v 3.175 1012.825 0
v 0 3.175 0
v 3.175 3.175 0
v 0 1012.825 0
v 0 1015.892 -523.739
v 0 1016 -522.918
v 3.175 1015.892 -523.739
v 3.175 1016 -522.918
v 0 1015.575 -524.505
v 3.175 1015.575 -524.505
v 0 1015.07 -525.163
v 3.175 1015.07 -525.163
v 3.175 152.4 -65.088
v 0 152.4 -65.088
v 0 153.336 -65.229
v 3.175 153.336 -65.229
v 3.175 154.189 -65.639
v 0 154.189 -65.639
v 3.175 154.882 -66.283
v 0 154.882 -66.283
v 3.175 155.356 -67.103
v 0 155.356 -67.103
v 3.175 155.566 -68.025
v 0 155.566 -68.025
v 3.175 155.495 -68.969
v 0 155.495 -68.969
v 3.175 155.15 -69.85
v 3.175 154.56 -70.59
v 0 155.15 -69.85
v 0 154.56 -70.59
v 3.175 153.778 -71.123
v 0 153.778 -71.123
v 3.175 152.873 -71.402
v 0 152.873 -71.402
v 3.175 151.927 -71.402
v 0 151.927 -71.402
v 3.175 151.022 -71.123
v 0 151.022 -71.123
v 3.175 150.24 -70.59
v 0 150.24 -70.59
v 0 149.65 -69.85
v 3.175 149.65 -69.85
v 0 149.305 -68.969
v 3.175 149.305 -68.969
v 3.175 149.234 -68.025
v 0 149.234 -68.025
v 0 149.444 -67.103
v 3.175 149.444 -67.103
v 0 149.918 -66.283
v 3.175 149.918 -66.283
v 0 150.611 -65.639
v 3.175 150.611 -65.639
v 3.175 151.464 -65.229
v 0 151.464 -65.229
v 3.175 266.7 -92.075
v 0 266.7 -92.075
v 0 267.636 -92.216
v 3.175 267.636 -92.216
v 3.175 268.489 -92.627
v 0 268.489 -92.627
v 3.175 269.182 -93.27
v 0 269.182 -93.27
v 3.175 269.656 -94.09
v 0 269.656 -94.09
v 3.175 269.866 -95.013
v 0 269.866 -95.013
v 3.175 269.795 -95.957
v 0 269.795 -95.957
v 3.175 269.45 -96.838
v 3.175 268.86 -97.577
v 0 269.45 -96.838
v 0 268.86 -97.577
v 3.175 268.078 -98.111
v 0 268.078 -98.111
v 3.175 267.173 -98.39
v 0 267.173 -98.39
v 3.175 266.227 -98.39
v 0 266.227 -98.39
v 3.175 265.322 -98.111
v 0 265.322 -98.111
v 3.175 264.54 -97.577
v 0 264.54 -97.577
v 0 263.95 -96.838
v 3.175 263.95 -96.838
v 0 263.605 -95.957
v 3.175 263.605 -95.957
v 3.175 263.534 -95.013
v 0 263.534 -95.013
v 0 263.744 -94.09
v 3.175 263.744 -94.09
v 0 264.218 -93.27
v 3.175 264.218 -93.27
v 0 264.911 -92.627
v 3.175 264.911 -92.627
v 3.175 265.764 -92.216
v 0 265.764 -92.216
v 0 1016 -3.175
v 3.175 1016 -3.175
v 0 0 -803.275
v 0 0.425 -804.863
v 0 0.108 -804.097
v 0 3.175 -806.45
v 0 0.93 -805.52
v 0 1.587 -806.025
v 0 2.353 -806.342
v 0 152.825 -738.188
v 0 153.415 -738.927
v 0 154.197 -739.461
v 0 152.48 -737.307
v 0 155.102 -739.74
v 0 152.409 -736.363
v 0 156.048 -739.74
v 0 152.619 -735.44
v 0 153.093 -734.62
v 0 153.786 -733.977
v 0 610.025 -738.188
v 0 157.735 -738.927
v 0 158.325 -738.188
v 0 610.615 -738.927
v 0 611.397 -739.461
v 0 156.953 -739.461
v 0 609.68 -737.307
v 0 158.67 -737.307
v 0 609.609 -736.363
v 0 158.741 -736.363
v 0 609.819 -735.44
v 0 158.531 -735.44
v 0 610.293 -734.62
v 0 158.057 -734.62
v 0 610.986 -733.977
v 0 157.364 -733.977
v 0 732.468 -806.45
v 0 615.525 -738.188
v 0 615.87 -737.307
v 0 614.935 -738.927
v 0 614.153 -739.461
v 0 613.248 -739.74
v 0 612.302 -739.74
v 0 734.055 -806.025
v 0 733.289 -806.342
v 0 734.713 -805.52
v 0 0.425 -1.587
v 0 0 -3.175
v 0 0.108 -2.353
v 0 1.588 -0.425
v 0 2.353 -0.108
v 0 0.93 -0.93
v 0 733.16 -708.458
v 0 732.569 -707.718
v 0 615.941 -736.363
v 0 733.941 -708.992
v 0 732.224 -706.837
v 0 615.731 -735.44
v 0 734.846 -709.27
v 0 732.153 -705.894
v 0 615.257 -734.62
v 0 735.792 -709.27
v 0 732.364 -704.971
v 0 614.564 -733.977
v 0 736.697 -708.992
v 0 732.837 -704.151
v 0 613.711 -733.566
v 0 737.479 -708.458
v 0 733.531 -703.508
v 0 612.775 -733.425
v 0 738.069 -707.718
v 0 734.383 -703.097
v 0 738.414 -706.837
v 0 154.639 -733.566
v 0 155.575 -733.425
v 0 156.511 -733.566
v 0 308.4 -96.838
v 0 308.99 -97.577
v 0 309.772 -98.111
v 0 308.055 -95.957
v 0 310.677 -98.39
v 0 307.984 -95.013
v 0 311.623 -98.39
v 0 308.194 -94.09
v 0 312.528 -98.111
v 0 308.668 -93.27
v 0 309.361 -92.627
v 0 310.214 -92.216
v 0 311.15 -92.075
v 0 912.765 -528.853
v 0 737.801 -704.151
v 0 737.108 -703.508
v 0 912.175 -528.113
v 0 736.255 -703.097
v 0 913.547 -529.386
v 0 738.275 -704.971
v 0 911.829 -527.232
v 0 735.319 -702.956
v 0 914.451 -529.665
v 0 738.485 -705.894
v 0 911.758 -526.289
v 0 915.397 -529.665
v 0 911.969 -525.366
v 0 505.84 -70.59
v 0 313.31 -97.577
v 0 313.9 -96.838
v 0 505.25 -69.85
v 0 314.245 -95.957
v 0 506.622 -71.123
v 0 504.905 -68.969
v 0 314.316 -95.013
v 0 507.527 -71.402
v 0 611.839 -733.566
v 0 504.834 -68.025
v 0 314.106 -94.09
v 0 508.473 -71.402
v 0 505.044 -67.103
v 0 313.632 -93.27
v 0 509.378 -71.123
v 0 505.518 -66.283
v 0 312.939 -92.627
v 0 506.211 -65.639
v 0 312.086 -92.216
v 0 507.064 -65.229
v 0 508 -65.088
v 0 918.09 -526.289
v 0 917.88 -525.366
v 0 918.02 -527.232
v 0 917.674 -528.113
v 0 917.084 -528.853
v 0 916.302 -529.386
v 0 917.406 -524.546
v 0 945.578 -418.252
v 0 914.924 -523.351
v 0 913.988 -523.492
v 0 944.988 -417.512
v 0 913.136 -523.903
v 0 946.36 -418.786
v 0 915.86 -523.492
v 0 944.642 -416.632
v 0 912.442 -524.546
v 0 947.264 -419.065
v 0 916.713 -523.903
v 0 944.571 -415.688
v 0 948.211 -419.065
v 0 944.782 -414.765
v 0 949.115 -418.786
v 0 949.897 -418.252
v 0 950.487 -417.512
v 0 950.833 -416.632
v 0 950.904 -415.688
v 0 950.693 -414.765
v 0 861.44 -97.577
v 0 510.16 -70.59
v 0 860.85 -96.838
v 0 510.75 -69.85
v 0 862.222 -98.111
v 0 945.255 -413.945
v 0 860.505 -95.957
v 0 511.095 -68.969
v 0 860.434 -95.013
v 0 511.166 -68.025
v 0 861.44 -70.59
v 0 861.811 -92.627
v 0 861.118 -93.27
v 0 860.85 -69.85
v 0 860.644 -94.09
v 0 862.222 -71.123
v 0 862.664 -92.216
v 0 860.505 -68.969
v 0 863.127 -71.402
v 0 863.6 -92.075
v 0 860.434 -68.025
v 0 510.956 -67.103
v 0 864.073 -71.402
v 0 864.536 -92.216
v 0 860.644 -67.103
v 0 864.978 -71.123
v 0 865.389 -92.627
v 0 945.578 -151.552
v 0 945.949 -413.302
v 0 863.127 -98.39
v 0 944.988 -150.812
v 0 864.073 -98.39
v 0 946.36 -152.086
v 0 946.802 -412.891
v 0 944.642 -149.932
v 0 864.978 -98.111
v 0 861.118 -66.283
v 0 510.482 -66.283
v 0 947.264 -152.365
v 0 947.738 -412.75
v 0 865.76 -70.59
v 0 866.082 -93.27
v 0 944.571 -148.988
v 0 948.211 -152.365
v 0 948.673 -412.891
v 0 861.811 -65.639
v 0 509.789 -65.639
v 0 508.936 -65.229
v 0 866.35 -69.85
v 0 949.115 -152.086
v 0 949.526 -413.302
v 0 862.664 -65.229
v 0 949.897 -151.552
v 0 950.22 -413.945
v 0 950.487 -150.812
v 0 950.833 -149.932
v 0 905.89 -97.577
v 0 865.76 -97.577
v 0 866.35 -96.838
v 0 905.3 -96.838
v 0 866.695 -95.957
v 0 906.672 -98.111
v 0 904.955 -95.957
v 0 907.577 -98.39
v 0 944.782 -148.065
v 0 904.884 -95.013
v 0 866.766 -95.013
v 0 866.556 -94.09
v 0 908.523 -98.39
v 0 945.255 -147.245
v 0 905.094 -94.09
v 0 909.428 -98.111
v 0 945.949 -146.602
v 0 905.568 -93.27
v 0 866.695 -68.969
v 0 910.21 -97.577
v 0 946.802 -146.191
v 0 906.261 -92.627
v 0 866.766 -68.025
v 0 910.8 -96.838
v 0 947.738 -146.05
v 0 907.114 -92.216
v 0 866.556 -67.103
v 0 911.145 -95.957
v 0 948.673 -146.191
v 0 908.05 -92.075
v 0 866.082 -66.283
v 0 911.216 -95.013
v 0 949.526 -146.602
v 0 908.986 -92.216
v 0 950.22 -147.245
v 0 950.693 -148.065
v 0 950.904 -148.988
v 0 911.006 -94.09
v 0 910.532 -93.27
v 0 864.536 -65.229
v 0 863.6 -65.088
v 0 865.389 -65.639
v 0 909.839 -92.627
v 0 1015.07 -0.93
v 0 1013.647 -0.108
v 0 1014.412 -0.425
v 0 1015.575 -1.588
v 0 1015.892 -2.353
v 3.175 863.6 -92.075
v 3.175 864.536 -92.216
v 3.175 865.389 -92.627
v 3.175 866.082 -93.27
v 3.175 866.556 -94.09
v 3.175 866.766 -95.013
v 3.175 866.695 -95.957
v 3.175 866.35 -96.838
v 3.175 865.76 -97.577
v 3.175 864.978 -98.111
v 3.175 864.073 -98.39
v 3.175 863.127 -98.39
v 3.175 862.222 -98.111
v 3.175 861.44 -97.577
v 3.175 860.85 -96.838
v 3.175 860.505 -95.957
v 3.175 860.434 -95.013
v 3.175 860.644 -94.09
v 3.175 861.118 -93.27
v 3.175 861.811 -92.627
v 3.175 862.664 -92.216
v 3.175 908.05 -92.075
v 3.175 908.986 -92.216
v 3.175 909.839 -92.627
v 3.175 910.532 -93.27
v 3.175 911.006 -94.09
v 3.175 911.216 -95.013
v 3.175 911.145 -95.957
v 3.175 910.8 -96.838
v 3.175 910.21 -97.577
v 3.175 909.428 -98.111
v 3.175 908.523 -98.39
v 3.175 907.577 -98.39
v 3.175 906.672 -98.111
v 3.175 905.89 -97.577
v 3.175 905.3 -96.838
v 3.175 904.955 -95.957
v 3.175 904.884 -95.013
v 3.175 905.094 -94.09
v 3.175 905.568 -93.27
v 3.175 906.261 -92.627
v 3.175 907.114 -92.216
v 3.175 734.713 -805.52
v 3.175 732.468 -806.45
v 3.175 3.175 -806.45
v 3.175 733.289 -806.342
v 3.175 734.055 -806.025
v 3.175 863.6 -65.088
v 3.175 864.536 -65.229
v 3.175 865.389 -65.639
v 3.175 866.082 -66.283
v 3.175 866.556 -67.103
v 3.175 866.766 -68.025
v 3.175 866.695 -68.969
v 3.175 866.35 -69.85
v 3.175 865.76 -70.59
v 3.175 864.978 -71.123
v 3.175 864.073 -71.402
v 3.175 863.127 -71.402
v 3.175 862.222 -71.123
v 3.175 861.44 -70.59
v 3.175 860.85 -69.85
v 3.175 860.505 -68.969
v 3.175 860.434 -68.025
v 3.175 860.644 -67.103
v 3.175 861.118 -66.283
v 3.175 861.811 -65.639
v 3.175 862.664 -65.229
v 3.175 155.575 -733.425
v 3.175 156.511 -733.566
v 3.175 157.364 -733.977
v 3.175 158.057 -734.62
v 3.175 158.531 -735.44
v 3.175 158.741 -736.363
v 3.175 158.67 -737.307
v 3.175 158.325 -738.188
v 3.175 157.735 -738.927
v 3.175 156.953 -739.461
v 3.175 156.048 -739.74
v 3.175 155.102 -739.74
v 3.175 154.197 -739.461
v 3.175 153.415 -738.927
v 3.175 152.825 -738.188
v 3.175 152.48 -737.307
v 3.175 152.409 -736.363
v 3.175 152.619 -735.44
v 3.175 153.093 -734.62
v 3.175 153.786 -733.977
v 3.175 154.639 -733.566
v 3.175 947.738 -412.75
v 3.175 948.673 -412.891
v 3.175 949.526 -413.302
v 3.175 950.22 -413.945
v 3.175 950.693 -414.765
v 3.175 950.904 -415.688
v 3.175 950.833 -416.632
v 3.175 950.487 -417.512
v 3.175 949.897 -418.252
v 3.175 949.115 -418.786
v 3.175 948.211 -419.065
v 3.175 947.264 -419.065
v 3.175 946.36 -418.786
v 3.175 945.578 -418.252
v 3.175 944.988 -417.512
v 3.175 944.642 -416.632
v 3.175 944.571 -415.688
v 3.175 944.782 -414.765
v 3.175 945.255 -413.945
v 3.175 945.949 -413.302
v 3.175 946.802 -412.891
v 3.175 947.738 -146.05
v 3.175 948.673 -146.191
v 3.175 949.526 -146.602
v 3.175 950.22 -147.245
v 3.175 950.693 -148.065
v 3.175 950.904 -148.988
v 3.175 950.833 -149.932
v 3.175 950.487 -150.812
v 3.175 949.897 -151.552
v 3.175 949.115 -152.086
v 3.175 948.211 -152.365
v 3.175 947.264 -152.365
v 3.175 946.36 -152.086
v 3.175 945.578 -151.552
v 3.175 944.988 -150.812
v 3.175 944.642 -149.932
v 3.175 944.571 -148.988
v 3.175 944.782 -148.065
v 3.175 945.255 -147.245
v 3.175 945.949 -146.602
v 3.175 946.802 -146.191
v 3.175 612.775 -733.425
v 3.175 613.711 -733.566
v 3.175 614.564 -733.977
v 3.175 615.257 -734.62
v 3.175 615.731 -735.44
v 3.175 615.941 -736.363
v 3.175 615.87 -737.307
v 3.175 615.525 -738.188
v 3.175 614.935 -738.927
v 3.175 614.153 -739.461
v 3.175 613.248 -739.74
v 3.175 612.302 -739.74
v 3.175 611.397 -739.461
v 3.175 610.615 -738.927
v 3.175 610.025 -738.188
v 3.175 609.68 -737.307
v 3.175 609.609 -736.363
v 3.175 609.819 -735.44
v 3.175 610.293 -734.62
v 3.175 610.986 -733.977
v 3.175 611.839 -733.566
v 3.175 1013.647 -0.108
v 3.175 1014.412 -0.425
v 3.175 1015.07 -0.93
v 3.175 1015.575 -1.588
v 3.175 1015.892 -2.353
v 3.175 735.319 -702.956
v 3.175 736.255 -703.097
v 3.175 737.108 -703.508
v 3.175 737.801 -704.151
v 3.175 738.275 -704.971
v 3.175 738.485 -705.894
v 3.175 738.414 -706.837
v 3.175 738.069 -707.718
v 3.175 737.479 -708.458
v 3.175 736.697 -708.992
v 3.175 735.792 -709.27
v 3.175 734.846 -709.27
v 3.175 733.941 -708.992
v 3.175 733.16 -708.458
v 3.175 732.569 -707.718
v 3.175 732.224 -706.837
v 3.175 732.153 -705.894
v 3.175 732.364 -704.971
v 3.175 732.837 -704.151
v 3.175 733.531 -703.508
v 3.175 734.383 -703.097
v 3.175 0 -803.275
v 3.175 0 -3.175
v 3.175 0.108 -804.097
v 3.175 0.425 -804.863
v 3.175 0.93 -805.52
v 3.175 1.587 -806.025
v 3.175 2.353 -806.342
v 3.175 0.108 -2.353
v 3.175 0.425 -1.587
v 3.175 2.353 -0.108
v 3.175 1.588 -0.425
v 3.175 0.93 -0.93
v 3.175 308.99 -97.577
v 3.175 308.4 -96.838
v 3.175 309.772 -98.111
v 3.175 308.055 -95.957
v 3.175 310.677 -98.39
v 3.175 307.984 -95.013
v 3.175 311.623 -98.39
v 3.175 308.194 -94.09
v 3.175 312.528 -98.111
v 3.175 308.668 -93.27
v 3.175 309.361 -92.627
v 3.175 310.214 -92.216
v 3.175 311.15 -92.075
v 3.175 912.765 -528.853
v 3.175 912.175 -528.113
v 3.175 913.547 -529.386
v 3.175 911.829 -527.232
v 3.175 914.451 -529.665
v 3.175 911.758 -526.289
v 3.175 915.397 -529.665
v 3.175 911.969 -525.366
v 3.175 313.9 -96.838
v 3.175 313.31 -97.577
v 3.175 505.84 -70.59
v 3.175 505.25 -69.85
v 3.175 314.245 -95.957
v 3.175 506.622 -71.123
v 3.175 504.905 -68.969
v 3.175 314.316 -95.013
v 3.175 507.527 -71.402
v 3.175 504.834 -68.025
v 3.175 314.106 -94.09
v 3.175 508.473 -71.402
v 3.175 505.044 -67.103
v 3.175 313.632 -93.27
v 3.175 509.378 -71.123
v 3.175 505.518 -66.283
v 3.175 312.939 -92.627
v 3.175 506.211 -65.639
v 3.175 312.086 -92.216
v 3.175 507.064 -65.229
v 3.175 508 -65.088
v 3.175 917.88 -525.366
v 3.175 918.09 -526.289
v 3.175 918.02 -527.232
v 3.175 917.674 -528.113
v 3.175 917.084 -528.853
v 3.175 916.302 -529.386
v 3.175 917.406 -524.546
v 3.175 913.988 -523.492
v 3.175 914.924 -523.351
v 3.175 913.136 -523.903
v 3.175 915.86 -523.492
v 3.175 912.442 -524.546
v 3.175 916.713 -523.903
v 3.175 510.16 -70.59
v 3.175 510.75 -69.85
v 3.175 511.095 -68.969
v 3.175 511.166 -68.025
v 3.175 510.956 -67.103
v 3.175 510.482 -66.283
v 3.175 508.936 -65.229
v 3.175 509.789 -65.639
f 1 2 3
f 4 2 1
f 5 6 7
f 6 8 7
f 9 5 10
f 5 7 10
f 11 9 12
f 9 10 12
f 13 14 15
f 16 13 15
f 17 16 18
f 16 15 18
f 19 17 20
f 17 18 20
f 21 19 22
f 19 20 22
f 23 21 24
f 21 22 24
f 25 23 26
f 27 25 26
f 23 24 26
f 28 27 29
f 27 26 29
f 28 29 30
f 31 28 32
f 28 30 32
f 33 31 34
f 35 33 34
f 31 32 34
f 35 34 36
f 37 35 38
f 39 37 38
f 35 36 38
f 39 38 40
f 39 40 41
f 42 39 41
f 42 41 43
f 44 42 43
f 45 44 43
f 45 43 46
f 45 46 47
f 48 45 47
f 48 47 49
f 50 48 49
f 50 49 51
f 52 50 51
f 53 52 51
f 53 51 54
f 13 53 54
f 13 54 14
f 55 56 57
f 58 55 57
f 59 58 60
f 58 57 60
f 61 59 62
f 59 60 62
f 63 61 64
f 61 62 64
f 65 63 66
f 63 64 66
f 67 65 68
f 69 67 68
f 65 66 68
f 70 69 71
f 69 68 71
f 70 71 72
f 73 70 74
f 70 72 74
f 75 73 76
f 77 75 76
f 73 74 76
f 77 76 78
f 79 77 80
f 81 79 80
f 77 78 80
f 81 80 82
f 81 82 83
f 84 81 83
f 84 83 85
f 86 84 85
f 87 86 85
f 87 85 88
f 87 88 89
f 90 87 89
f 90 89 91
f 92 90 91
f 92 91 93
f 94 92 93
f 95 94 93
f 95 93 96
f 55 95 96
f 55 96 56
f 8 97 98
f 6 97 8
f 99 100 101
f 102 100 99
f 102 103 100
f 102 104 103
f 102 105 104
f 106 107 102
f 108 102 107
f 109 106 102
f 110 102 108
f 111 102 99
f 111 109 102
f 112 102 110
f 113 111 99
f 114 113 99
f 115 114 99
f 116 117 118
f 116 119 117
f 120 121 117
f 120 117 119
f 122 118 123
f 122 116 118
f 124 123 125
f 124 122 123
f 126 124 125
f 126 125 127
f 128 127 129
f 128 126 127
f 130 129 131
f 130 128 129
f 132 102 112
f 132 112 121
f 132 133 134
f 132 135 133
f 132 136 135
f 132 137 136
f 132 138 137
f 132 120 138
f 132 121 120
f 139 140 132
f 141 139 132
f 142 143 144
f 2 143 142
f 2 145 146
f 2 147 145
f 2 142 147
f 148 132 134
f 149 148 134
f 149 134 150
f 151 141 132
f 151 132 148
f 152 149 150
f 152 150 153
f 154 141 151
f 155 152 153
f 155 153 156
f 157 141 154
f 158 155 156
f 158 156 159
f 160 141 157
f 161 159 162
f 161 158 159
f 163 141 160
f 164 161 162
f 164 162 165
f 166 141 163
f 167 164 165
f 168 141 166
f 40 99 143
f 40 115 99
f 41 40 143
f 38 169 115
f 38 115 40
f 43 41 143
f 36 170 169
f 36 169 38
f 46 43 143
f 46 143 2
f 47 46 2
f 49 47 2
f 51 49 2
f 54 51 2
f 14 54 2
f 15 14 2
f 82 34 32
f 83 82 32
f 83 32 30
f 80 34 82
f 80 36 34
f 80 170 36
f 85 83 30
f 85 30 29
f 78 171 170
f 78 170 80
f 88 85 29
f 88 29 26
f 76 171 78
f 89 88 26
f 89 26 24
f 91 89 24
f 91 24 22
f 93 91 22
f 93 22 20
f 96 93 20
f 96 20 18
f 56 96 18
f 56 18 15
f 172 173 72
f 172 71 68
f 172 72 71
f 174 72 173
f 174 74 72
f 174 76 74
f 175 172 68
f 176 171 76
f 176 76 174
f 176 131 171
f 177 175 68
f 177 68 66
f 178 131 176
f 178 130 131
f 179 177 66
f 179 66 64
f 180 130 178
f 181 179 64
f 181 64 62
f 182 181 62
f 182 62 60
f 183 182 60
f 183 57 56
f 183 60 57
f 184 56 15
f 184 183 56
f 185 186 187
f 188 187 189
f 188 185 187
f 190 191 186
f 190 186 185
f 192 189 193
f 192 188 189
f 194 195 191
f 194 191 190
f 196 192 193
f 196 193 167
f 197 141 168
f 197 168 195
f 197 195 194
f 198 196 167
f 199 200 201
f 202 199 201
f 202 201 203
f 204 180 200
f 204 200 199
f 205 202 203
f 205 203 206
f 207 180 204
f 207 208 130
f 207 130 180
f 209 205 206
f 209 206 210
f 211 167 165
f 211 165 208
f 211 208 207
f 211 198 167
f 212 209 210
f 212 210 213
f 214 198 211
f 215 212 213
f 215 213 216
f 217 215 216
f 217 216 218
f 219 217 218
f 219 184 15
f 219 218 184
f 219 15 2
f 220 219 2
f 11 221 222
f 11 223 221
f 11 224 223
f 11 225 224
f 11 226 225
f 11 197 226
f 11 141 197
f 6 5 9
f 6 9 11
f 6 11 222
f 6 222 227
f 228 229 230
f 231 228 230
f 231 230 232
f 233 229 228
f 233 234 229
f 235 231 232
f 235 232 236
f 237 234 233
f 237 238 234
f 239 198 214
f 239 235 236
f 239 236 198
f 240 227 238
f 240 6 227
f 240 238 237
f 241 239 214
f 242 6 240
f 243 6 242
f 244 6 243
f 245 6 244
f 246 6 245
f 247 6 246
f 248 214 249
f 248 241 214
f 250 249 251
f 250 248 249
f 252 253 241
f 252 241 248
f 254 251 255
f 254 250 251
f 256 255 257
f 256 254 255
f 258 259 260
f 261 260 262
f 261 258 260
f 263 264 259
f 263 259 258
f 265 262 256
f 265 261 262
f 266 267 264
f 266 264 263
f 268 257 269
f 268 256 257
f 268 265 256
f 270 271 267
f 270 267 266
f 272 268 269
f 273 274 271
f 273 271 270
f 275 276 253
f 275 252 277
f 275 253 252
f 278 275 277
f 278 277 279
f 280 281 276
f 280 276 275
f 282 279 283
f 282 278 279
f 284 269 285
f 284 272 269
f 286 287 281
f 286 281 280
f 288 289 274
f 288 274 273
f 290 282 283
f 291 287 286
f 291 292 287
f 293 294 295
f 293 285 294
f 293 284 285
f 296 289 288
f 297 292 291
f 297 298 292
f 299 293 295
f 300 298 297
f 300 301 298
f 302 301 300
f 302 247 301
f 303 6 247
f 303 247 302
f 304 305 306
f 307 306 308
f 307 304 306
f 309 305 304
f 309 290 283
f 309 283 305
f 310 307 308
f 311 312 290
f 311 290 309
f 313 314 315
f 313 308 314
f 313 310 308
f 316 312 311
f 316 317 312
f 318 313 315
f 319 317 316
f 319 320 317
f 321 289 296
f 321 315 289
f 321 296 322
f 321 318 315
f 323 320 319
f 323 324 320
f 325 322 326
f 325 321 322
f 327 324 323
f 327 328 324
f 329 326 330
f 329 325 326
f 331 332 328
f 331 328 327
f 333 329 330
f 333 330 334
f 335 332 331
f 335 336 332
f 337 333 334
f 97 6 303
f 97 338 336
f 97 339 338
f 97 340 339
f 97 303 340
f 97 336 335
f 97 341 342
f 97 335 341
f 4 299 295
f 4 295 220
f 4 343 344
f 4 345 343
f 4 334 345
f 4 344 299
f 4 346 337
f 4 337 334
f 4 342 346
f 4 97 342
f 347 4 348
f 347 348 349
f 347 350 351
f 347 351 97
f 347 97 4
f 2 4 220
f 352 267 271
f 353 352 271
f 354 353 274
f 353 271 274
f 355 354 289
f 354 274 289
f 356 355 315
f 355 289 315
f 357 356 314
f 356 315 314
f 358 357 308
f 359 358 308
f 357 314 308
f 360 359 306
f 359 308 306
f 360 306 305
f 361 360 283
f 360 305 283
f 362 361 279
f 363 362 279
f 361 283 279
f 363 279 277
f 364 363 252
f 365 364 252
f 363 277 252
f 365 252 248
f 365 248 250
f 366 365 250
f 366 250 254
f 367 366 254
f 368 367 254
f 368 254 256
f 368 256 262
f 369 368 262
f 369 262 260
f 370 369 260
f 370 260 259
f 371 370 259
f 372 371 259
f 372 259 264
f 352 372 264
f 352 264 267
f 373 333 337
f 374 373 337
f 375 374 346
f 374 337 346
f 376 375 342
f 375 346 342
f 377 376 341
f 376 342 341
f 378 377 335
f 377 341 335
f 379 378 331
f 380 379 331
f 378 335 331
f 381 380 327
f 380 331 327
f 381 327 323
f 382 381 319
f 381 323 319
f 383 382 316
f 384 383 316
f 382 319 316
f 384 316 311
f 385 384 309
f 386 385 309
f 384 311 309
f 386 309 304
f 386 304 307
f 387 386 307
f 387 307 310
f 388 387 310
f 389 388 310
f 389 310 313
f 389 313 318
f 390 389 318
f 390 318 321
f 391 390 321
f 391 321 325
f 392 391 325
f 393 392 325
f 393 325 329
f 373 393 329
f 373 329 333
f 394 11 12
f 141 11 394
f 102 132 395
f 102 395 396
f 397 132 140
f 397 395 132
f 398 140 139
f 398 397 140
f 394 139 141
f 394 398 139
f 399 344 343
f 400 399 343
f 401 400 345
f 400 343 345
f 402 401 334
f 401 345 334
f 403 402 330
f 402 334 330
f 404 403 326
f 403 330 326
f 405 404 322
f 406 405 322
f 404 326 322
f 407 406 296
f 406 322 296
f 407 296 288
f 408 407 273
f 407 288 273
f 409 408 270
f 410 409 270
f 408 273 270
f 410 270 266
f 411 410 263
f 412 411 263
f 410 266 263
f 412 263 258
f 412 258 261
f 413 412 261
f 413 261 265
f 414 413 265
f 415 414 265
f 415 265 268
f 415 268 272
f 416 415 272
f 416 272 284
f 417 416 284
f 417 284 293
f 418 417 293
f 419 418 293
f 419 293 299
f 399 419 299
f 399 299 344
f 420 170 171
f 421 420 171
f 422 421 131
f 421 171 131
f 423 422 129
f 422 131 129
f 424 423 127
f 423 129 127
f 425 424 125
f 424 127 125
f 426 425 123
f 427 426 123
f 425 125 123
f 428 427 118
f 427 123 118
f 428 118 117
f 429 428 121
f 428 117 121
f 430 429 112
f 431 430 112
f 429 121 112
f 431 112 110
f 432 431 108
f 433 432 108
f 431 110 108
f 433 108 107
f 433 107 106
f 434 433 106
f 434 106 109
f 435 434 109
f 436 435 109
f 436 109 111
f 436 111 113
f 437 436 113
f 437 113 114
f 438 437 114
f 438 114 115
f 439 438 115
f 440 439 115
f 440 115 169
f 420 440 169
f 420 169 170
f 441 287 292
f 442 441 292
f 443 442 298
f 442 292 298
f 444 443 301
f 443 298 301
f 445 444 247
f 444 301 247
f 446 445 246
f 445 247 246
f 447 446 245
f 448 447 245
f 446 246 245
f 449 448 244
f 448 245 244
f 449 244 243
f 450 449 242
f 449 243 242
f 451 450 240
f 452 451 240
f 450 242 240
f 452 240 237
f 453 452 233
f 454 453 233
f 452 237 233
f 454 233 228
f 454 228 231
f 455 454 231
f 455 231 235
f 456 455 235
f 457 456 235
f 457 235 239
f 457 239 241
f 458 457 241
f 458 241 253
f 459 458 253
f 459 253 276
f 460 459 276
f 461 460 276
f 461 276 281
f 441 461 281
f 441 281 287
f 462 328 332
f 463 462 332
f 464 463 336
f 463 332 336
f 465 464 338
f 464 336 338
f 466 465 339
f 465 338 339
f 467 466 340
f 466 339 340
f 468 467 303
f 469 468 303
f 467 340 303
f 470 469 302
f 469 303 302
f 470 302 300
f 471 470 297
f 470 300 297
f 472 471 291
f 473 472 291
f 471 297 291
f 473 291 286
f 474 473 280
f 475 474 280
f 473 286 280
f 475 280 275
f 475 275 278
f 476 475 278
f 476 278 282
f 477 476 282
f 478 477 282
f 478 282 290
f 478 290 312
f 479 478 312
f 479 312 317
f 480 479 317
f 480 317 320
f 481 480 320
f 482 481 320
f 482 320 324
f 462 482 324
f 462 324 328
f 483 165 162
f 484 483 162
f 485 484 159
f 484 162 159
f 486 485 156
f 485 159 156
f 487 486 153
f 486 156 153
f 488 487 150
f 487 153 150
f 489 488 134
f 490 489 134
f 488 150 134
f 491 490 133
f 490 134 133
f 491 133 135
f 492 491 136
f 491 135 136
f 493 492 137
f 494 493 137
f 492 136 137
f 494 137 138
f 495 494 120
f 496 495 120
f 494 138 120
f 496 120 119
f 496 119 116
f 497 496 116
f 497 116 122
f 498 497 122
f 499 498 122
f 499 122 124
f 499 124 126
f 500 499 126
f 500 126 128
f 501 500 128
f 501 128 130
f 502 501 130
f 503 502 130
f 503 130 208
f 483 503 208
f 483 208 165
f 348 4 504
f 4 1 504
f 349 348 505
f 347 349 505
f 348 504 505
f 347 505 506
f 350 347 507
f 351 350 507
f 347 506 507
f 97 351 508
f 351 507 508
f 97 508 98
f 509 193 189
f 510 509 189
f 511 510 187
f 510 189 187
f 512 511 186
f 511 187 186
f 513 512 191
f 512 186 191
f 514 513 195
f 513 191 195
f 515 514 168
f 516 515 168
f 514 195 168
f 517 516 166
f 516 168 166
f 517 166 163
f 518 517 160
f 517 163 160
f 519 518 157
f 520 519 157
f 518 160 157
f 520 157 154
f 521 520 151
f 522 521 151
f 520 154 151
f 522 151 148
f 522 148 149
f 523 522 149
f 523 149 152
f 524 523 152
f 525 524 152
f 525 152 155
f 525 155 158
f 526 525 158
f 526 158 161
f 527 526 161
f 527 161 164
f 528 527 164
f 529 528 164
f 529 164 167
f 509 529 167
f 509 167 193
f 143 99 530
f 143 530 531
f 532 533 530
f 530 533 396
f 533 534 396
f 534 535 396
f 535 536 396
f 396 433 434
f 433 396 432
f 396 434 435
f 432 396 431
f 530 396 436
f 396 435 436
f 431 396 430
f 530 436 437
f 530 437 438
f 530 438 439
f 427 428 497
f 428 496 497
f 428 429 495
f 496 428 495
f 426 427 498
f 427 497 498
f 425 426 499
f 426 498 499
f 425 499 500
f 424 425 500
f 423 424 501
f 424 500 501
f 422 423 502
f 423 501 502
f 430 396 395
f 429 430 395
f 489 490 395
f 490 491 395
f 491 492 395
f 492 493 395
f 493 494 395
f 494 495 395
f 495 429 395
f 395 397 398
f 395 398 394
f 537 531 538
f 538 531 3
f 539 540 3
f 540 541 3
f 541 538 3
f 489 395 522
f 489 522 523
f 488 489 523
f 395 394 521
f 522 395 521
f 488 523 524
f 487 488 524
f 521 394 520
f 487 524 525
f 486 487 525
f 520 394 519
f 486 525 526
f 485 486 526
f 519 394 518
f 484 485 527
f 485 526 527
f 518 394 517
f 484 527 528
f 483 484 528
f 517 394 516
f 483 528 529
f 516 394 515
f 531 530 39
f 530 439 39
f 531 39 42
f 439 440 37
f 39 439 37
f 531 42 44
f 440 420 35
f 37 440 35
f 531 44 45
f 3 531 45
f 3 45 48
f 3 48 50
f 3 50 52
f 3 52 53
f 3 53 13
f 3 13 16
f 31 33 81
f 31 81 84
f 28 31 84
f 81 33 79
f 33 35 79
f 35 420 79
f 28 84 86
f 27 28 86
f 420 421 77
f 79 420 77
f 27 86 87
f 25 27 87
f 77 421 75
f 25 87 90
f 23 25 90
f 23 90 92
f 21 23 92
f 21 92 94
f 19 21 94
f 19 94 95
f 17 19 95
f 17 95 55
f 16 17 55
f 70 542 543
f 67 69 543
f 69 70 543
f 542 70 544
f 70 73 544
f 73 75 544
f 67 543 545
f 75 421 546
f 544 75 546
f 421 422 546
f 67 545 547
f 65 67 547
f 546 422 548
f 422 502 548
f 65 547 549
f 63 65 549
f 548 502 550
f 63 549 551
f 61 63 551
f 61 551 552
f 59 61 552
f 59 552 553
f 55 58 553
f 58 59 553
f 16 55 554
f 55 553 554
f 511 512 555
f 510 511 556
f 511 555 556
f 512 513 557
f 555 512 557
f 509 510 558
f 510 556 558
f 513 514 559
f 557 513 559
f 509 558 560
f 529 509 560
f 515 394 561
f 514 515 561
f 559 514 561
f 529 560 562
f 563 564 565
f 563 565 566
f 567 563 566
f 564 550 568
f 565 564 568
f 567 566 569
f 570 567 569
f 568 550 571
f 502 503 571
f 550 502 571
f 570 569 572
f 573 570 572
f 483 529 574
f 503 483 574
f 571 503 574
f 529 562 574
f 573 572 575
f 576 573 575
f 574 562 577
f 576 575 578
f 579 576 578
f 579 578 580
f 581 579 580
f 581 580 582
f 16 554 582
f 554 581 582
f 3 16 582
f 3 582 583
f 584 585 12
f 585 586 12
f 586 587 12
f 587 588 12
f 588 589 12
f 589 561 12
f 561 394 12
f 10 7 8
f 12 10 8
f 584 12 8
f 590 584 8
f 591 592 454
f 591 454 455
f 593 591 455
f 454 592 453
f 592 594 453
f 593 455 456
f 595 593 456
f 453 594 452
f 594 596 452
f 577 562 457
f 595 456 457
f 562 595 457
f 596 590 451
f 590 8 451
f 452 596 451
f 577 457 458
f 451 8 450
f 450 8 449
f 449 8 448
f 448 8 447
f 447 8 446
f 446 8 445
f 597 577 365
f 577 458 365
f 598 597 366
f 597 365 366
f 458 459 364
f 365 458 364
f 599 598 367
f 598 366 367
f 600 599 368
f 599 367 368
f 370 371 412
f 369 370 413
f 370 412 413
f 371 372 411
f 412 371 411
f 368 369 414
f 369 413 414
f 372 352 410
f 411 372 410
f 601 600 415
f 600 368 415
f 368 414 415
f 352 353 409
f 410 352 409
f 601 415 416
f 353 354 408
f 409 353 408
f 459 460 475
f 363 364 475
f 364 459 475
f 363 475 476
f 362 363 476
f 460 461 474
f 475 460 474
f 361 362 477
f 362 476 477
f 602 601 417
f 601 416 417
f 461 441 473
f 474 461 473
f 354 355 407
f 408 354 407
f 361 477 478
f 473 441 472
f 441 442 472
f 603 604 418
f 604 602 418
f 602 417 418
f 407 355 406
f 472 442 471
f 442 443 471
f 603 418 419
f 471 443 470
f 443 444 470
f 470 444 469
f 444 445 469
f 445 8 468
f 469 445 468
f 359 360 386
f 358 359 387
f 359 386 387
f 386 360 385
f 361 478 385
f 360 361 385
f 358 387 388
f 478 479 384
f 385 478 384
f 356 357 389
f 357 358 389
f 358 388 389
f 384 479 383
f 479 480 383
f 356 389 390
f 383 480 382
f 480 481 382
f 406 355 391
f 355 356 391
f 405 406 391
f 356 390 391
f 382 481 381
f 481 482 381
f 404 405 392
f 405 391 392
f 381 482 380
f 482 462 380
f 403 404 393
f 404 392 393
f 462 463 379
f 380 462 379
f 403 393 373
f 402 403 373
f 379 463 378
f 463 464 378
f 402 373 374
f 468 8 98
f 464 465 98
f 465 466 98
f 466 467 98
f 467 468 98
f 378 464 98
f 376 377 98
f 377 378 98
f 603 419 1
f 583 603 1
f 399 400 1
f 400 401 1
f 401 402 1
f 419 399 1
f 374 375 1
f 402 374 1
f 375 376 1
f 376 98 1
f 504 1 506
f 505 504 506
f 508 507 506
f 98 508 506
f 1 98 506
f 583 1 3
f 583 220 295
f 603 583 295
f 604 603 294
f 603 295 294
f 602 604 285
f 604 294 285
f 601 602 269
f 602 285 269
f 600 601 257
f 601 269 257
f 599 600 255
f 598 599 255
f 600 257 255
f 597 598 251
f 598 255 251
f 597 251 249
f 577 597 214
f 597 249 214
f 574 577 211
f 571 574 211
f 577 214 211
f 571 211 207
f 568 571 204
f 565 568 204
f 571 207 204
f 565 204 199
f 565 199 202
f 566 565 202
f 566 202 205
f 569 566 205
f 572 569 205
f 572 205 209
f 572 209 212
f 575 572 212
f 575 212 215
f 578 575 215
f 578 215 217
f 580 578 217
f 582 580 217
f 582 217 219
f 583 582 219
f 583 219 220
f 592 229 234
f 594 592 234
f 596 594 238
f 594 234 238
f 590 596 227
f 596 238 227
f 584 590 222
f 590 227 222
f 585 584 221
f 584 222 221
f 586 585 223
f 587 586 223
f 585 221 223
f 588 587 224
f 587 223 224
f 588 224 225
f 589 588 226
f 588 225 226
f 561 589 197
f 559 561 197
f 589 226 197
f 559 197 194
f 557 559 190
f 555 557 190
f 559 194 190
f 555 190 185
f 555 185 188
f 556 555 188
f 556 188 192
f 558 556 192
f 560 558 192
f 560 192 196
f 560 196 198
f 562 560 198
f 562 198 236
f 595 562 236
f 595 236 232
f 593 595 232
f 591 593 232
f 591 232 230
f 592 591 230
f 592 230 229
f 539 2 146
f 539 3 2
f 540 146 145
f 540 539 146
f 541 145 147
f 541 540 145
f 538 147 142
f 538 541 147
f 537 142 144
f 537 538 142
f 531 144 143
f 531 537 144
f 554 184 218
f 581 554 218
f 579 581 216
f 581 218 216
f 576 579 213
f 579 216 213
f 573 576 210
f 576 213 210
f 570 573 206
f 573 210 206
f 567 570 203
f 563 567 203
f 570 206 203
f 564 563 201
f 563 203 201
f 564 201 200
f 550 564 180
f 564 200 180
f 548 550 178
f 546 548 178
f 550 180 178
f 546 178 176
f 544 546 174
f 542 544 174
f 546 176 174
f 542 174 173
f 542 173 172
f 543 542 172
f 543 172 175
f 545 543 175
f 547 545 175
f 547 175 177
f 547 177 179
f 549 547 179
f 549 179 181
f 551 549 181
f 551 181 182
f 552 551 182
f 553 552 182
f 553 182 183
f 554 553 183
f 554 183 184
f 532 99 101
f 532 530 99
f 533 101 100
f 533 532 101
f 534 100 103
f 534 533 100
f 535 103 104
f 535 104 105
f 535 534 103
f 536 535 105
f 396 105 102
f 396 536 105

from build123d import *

# Parameters (mm, degrees)
BOSS_EXTRUDE1_DEPTH         = 3.175
F_1_4_0_25_DIAMETER_HOLE1_D = 6.35
FILLET1_R                   = 3.175


with BuildPart() as part:
    # Sketch1 → Boss-Extrude1 (new body)
    with BuildSketch(Plane(origin=(0, 0, 0), x_dir=(0, 0, -1), z_dir=(1, 0, 0))):
        Polygon((0, 0), (0, 1016), (524.232817332, 1016), (806.45, 733.782817332), (806.45, 0), align=None)
    extrude(amount=BOSS_EXTRUDE1_DEPTH)

    # 1/4 (0.25) Diameter Hole1 (through all)
    with Locations(Plane(origin=(3.175, 0, 0), x_dir=(0, 0, -1), z_dir=(1, 0, 0))):
        with Locations((95.25, 908.05), (68.2625, 152.4), (68.2625, 508), (68.2625, 863.6), (149.225, 947.7375), (415.925, 947.7375), (736.6, 155.575), (736.6, 612.775), (706.130949904, 735.319050096), (526.525827482, 914.924172518), (95.25, 266.7), (95.25, 311.15), (95.25, 863.6)):
            Hole(F_1_4_0_25_DIAMETER_HOLE1_D / 2)

    # Fillet1
    fillet1_edges = [part.edges().sort_by_distance(p)[0] for p in [
        (1.5875, 0, 0),
        (1.5875, 1016, 0),
        (1.5875, 1016, -524.232817332),
        (1.5875, 733.782817332, -806.45),
        (1.5875, 0, -806.45),
    ]]
    fillet(fillet1_edges, radius=FILLET1_R)


solid = part.part
